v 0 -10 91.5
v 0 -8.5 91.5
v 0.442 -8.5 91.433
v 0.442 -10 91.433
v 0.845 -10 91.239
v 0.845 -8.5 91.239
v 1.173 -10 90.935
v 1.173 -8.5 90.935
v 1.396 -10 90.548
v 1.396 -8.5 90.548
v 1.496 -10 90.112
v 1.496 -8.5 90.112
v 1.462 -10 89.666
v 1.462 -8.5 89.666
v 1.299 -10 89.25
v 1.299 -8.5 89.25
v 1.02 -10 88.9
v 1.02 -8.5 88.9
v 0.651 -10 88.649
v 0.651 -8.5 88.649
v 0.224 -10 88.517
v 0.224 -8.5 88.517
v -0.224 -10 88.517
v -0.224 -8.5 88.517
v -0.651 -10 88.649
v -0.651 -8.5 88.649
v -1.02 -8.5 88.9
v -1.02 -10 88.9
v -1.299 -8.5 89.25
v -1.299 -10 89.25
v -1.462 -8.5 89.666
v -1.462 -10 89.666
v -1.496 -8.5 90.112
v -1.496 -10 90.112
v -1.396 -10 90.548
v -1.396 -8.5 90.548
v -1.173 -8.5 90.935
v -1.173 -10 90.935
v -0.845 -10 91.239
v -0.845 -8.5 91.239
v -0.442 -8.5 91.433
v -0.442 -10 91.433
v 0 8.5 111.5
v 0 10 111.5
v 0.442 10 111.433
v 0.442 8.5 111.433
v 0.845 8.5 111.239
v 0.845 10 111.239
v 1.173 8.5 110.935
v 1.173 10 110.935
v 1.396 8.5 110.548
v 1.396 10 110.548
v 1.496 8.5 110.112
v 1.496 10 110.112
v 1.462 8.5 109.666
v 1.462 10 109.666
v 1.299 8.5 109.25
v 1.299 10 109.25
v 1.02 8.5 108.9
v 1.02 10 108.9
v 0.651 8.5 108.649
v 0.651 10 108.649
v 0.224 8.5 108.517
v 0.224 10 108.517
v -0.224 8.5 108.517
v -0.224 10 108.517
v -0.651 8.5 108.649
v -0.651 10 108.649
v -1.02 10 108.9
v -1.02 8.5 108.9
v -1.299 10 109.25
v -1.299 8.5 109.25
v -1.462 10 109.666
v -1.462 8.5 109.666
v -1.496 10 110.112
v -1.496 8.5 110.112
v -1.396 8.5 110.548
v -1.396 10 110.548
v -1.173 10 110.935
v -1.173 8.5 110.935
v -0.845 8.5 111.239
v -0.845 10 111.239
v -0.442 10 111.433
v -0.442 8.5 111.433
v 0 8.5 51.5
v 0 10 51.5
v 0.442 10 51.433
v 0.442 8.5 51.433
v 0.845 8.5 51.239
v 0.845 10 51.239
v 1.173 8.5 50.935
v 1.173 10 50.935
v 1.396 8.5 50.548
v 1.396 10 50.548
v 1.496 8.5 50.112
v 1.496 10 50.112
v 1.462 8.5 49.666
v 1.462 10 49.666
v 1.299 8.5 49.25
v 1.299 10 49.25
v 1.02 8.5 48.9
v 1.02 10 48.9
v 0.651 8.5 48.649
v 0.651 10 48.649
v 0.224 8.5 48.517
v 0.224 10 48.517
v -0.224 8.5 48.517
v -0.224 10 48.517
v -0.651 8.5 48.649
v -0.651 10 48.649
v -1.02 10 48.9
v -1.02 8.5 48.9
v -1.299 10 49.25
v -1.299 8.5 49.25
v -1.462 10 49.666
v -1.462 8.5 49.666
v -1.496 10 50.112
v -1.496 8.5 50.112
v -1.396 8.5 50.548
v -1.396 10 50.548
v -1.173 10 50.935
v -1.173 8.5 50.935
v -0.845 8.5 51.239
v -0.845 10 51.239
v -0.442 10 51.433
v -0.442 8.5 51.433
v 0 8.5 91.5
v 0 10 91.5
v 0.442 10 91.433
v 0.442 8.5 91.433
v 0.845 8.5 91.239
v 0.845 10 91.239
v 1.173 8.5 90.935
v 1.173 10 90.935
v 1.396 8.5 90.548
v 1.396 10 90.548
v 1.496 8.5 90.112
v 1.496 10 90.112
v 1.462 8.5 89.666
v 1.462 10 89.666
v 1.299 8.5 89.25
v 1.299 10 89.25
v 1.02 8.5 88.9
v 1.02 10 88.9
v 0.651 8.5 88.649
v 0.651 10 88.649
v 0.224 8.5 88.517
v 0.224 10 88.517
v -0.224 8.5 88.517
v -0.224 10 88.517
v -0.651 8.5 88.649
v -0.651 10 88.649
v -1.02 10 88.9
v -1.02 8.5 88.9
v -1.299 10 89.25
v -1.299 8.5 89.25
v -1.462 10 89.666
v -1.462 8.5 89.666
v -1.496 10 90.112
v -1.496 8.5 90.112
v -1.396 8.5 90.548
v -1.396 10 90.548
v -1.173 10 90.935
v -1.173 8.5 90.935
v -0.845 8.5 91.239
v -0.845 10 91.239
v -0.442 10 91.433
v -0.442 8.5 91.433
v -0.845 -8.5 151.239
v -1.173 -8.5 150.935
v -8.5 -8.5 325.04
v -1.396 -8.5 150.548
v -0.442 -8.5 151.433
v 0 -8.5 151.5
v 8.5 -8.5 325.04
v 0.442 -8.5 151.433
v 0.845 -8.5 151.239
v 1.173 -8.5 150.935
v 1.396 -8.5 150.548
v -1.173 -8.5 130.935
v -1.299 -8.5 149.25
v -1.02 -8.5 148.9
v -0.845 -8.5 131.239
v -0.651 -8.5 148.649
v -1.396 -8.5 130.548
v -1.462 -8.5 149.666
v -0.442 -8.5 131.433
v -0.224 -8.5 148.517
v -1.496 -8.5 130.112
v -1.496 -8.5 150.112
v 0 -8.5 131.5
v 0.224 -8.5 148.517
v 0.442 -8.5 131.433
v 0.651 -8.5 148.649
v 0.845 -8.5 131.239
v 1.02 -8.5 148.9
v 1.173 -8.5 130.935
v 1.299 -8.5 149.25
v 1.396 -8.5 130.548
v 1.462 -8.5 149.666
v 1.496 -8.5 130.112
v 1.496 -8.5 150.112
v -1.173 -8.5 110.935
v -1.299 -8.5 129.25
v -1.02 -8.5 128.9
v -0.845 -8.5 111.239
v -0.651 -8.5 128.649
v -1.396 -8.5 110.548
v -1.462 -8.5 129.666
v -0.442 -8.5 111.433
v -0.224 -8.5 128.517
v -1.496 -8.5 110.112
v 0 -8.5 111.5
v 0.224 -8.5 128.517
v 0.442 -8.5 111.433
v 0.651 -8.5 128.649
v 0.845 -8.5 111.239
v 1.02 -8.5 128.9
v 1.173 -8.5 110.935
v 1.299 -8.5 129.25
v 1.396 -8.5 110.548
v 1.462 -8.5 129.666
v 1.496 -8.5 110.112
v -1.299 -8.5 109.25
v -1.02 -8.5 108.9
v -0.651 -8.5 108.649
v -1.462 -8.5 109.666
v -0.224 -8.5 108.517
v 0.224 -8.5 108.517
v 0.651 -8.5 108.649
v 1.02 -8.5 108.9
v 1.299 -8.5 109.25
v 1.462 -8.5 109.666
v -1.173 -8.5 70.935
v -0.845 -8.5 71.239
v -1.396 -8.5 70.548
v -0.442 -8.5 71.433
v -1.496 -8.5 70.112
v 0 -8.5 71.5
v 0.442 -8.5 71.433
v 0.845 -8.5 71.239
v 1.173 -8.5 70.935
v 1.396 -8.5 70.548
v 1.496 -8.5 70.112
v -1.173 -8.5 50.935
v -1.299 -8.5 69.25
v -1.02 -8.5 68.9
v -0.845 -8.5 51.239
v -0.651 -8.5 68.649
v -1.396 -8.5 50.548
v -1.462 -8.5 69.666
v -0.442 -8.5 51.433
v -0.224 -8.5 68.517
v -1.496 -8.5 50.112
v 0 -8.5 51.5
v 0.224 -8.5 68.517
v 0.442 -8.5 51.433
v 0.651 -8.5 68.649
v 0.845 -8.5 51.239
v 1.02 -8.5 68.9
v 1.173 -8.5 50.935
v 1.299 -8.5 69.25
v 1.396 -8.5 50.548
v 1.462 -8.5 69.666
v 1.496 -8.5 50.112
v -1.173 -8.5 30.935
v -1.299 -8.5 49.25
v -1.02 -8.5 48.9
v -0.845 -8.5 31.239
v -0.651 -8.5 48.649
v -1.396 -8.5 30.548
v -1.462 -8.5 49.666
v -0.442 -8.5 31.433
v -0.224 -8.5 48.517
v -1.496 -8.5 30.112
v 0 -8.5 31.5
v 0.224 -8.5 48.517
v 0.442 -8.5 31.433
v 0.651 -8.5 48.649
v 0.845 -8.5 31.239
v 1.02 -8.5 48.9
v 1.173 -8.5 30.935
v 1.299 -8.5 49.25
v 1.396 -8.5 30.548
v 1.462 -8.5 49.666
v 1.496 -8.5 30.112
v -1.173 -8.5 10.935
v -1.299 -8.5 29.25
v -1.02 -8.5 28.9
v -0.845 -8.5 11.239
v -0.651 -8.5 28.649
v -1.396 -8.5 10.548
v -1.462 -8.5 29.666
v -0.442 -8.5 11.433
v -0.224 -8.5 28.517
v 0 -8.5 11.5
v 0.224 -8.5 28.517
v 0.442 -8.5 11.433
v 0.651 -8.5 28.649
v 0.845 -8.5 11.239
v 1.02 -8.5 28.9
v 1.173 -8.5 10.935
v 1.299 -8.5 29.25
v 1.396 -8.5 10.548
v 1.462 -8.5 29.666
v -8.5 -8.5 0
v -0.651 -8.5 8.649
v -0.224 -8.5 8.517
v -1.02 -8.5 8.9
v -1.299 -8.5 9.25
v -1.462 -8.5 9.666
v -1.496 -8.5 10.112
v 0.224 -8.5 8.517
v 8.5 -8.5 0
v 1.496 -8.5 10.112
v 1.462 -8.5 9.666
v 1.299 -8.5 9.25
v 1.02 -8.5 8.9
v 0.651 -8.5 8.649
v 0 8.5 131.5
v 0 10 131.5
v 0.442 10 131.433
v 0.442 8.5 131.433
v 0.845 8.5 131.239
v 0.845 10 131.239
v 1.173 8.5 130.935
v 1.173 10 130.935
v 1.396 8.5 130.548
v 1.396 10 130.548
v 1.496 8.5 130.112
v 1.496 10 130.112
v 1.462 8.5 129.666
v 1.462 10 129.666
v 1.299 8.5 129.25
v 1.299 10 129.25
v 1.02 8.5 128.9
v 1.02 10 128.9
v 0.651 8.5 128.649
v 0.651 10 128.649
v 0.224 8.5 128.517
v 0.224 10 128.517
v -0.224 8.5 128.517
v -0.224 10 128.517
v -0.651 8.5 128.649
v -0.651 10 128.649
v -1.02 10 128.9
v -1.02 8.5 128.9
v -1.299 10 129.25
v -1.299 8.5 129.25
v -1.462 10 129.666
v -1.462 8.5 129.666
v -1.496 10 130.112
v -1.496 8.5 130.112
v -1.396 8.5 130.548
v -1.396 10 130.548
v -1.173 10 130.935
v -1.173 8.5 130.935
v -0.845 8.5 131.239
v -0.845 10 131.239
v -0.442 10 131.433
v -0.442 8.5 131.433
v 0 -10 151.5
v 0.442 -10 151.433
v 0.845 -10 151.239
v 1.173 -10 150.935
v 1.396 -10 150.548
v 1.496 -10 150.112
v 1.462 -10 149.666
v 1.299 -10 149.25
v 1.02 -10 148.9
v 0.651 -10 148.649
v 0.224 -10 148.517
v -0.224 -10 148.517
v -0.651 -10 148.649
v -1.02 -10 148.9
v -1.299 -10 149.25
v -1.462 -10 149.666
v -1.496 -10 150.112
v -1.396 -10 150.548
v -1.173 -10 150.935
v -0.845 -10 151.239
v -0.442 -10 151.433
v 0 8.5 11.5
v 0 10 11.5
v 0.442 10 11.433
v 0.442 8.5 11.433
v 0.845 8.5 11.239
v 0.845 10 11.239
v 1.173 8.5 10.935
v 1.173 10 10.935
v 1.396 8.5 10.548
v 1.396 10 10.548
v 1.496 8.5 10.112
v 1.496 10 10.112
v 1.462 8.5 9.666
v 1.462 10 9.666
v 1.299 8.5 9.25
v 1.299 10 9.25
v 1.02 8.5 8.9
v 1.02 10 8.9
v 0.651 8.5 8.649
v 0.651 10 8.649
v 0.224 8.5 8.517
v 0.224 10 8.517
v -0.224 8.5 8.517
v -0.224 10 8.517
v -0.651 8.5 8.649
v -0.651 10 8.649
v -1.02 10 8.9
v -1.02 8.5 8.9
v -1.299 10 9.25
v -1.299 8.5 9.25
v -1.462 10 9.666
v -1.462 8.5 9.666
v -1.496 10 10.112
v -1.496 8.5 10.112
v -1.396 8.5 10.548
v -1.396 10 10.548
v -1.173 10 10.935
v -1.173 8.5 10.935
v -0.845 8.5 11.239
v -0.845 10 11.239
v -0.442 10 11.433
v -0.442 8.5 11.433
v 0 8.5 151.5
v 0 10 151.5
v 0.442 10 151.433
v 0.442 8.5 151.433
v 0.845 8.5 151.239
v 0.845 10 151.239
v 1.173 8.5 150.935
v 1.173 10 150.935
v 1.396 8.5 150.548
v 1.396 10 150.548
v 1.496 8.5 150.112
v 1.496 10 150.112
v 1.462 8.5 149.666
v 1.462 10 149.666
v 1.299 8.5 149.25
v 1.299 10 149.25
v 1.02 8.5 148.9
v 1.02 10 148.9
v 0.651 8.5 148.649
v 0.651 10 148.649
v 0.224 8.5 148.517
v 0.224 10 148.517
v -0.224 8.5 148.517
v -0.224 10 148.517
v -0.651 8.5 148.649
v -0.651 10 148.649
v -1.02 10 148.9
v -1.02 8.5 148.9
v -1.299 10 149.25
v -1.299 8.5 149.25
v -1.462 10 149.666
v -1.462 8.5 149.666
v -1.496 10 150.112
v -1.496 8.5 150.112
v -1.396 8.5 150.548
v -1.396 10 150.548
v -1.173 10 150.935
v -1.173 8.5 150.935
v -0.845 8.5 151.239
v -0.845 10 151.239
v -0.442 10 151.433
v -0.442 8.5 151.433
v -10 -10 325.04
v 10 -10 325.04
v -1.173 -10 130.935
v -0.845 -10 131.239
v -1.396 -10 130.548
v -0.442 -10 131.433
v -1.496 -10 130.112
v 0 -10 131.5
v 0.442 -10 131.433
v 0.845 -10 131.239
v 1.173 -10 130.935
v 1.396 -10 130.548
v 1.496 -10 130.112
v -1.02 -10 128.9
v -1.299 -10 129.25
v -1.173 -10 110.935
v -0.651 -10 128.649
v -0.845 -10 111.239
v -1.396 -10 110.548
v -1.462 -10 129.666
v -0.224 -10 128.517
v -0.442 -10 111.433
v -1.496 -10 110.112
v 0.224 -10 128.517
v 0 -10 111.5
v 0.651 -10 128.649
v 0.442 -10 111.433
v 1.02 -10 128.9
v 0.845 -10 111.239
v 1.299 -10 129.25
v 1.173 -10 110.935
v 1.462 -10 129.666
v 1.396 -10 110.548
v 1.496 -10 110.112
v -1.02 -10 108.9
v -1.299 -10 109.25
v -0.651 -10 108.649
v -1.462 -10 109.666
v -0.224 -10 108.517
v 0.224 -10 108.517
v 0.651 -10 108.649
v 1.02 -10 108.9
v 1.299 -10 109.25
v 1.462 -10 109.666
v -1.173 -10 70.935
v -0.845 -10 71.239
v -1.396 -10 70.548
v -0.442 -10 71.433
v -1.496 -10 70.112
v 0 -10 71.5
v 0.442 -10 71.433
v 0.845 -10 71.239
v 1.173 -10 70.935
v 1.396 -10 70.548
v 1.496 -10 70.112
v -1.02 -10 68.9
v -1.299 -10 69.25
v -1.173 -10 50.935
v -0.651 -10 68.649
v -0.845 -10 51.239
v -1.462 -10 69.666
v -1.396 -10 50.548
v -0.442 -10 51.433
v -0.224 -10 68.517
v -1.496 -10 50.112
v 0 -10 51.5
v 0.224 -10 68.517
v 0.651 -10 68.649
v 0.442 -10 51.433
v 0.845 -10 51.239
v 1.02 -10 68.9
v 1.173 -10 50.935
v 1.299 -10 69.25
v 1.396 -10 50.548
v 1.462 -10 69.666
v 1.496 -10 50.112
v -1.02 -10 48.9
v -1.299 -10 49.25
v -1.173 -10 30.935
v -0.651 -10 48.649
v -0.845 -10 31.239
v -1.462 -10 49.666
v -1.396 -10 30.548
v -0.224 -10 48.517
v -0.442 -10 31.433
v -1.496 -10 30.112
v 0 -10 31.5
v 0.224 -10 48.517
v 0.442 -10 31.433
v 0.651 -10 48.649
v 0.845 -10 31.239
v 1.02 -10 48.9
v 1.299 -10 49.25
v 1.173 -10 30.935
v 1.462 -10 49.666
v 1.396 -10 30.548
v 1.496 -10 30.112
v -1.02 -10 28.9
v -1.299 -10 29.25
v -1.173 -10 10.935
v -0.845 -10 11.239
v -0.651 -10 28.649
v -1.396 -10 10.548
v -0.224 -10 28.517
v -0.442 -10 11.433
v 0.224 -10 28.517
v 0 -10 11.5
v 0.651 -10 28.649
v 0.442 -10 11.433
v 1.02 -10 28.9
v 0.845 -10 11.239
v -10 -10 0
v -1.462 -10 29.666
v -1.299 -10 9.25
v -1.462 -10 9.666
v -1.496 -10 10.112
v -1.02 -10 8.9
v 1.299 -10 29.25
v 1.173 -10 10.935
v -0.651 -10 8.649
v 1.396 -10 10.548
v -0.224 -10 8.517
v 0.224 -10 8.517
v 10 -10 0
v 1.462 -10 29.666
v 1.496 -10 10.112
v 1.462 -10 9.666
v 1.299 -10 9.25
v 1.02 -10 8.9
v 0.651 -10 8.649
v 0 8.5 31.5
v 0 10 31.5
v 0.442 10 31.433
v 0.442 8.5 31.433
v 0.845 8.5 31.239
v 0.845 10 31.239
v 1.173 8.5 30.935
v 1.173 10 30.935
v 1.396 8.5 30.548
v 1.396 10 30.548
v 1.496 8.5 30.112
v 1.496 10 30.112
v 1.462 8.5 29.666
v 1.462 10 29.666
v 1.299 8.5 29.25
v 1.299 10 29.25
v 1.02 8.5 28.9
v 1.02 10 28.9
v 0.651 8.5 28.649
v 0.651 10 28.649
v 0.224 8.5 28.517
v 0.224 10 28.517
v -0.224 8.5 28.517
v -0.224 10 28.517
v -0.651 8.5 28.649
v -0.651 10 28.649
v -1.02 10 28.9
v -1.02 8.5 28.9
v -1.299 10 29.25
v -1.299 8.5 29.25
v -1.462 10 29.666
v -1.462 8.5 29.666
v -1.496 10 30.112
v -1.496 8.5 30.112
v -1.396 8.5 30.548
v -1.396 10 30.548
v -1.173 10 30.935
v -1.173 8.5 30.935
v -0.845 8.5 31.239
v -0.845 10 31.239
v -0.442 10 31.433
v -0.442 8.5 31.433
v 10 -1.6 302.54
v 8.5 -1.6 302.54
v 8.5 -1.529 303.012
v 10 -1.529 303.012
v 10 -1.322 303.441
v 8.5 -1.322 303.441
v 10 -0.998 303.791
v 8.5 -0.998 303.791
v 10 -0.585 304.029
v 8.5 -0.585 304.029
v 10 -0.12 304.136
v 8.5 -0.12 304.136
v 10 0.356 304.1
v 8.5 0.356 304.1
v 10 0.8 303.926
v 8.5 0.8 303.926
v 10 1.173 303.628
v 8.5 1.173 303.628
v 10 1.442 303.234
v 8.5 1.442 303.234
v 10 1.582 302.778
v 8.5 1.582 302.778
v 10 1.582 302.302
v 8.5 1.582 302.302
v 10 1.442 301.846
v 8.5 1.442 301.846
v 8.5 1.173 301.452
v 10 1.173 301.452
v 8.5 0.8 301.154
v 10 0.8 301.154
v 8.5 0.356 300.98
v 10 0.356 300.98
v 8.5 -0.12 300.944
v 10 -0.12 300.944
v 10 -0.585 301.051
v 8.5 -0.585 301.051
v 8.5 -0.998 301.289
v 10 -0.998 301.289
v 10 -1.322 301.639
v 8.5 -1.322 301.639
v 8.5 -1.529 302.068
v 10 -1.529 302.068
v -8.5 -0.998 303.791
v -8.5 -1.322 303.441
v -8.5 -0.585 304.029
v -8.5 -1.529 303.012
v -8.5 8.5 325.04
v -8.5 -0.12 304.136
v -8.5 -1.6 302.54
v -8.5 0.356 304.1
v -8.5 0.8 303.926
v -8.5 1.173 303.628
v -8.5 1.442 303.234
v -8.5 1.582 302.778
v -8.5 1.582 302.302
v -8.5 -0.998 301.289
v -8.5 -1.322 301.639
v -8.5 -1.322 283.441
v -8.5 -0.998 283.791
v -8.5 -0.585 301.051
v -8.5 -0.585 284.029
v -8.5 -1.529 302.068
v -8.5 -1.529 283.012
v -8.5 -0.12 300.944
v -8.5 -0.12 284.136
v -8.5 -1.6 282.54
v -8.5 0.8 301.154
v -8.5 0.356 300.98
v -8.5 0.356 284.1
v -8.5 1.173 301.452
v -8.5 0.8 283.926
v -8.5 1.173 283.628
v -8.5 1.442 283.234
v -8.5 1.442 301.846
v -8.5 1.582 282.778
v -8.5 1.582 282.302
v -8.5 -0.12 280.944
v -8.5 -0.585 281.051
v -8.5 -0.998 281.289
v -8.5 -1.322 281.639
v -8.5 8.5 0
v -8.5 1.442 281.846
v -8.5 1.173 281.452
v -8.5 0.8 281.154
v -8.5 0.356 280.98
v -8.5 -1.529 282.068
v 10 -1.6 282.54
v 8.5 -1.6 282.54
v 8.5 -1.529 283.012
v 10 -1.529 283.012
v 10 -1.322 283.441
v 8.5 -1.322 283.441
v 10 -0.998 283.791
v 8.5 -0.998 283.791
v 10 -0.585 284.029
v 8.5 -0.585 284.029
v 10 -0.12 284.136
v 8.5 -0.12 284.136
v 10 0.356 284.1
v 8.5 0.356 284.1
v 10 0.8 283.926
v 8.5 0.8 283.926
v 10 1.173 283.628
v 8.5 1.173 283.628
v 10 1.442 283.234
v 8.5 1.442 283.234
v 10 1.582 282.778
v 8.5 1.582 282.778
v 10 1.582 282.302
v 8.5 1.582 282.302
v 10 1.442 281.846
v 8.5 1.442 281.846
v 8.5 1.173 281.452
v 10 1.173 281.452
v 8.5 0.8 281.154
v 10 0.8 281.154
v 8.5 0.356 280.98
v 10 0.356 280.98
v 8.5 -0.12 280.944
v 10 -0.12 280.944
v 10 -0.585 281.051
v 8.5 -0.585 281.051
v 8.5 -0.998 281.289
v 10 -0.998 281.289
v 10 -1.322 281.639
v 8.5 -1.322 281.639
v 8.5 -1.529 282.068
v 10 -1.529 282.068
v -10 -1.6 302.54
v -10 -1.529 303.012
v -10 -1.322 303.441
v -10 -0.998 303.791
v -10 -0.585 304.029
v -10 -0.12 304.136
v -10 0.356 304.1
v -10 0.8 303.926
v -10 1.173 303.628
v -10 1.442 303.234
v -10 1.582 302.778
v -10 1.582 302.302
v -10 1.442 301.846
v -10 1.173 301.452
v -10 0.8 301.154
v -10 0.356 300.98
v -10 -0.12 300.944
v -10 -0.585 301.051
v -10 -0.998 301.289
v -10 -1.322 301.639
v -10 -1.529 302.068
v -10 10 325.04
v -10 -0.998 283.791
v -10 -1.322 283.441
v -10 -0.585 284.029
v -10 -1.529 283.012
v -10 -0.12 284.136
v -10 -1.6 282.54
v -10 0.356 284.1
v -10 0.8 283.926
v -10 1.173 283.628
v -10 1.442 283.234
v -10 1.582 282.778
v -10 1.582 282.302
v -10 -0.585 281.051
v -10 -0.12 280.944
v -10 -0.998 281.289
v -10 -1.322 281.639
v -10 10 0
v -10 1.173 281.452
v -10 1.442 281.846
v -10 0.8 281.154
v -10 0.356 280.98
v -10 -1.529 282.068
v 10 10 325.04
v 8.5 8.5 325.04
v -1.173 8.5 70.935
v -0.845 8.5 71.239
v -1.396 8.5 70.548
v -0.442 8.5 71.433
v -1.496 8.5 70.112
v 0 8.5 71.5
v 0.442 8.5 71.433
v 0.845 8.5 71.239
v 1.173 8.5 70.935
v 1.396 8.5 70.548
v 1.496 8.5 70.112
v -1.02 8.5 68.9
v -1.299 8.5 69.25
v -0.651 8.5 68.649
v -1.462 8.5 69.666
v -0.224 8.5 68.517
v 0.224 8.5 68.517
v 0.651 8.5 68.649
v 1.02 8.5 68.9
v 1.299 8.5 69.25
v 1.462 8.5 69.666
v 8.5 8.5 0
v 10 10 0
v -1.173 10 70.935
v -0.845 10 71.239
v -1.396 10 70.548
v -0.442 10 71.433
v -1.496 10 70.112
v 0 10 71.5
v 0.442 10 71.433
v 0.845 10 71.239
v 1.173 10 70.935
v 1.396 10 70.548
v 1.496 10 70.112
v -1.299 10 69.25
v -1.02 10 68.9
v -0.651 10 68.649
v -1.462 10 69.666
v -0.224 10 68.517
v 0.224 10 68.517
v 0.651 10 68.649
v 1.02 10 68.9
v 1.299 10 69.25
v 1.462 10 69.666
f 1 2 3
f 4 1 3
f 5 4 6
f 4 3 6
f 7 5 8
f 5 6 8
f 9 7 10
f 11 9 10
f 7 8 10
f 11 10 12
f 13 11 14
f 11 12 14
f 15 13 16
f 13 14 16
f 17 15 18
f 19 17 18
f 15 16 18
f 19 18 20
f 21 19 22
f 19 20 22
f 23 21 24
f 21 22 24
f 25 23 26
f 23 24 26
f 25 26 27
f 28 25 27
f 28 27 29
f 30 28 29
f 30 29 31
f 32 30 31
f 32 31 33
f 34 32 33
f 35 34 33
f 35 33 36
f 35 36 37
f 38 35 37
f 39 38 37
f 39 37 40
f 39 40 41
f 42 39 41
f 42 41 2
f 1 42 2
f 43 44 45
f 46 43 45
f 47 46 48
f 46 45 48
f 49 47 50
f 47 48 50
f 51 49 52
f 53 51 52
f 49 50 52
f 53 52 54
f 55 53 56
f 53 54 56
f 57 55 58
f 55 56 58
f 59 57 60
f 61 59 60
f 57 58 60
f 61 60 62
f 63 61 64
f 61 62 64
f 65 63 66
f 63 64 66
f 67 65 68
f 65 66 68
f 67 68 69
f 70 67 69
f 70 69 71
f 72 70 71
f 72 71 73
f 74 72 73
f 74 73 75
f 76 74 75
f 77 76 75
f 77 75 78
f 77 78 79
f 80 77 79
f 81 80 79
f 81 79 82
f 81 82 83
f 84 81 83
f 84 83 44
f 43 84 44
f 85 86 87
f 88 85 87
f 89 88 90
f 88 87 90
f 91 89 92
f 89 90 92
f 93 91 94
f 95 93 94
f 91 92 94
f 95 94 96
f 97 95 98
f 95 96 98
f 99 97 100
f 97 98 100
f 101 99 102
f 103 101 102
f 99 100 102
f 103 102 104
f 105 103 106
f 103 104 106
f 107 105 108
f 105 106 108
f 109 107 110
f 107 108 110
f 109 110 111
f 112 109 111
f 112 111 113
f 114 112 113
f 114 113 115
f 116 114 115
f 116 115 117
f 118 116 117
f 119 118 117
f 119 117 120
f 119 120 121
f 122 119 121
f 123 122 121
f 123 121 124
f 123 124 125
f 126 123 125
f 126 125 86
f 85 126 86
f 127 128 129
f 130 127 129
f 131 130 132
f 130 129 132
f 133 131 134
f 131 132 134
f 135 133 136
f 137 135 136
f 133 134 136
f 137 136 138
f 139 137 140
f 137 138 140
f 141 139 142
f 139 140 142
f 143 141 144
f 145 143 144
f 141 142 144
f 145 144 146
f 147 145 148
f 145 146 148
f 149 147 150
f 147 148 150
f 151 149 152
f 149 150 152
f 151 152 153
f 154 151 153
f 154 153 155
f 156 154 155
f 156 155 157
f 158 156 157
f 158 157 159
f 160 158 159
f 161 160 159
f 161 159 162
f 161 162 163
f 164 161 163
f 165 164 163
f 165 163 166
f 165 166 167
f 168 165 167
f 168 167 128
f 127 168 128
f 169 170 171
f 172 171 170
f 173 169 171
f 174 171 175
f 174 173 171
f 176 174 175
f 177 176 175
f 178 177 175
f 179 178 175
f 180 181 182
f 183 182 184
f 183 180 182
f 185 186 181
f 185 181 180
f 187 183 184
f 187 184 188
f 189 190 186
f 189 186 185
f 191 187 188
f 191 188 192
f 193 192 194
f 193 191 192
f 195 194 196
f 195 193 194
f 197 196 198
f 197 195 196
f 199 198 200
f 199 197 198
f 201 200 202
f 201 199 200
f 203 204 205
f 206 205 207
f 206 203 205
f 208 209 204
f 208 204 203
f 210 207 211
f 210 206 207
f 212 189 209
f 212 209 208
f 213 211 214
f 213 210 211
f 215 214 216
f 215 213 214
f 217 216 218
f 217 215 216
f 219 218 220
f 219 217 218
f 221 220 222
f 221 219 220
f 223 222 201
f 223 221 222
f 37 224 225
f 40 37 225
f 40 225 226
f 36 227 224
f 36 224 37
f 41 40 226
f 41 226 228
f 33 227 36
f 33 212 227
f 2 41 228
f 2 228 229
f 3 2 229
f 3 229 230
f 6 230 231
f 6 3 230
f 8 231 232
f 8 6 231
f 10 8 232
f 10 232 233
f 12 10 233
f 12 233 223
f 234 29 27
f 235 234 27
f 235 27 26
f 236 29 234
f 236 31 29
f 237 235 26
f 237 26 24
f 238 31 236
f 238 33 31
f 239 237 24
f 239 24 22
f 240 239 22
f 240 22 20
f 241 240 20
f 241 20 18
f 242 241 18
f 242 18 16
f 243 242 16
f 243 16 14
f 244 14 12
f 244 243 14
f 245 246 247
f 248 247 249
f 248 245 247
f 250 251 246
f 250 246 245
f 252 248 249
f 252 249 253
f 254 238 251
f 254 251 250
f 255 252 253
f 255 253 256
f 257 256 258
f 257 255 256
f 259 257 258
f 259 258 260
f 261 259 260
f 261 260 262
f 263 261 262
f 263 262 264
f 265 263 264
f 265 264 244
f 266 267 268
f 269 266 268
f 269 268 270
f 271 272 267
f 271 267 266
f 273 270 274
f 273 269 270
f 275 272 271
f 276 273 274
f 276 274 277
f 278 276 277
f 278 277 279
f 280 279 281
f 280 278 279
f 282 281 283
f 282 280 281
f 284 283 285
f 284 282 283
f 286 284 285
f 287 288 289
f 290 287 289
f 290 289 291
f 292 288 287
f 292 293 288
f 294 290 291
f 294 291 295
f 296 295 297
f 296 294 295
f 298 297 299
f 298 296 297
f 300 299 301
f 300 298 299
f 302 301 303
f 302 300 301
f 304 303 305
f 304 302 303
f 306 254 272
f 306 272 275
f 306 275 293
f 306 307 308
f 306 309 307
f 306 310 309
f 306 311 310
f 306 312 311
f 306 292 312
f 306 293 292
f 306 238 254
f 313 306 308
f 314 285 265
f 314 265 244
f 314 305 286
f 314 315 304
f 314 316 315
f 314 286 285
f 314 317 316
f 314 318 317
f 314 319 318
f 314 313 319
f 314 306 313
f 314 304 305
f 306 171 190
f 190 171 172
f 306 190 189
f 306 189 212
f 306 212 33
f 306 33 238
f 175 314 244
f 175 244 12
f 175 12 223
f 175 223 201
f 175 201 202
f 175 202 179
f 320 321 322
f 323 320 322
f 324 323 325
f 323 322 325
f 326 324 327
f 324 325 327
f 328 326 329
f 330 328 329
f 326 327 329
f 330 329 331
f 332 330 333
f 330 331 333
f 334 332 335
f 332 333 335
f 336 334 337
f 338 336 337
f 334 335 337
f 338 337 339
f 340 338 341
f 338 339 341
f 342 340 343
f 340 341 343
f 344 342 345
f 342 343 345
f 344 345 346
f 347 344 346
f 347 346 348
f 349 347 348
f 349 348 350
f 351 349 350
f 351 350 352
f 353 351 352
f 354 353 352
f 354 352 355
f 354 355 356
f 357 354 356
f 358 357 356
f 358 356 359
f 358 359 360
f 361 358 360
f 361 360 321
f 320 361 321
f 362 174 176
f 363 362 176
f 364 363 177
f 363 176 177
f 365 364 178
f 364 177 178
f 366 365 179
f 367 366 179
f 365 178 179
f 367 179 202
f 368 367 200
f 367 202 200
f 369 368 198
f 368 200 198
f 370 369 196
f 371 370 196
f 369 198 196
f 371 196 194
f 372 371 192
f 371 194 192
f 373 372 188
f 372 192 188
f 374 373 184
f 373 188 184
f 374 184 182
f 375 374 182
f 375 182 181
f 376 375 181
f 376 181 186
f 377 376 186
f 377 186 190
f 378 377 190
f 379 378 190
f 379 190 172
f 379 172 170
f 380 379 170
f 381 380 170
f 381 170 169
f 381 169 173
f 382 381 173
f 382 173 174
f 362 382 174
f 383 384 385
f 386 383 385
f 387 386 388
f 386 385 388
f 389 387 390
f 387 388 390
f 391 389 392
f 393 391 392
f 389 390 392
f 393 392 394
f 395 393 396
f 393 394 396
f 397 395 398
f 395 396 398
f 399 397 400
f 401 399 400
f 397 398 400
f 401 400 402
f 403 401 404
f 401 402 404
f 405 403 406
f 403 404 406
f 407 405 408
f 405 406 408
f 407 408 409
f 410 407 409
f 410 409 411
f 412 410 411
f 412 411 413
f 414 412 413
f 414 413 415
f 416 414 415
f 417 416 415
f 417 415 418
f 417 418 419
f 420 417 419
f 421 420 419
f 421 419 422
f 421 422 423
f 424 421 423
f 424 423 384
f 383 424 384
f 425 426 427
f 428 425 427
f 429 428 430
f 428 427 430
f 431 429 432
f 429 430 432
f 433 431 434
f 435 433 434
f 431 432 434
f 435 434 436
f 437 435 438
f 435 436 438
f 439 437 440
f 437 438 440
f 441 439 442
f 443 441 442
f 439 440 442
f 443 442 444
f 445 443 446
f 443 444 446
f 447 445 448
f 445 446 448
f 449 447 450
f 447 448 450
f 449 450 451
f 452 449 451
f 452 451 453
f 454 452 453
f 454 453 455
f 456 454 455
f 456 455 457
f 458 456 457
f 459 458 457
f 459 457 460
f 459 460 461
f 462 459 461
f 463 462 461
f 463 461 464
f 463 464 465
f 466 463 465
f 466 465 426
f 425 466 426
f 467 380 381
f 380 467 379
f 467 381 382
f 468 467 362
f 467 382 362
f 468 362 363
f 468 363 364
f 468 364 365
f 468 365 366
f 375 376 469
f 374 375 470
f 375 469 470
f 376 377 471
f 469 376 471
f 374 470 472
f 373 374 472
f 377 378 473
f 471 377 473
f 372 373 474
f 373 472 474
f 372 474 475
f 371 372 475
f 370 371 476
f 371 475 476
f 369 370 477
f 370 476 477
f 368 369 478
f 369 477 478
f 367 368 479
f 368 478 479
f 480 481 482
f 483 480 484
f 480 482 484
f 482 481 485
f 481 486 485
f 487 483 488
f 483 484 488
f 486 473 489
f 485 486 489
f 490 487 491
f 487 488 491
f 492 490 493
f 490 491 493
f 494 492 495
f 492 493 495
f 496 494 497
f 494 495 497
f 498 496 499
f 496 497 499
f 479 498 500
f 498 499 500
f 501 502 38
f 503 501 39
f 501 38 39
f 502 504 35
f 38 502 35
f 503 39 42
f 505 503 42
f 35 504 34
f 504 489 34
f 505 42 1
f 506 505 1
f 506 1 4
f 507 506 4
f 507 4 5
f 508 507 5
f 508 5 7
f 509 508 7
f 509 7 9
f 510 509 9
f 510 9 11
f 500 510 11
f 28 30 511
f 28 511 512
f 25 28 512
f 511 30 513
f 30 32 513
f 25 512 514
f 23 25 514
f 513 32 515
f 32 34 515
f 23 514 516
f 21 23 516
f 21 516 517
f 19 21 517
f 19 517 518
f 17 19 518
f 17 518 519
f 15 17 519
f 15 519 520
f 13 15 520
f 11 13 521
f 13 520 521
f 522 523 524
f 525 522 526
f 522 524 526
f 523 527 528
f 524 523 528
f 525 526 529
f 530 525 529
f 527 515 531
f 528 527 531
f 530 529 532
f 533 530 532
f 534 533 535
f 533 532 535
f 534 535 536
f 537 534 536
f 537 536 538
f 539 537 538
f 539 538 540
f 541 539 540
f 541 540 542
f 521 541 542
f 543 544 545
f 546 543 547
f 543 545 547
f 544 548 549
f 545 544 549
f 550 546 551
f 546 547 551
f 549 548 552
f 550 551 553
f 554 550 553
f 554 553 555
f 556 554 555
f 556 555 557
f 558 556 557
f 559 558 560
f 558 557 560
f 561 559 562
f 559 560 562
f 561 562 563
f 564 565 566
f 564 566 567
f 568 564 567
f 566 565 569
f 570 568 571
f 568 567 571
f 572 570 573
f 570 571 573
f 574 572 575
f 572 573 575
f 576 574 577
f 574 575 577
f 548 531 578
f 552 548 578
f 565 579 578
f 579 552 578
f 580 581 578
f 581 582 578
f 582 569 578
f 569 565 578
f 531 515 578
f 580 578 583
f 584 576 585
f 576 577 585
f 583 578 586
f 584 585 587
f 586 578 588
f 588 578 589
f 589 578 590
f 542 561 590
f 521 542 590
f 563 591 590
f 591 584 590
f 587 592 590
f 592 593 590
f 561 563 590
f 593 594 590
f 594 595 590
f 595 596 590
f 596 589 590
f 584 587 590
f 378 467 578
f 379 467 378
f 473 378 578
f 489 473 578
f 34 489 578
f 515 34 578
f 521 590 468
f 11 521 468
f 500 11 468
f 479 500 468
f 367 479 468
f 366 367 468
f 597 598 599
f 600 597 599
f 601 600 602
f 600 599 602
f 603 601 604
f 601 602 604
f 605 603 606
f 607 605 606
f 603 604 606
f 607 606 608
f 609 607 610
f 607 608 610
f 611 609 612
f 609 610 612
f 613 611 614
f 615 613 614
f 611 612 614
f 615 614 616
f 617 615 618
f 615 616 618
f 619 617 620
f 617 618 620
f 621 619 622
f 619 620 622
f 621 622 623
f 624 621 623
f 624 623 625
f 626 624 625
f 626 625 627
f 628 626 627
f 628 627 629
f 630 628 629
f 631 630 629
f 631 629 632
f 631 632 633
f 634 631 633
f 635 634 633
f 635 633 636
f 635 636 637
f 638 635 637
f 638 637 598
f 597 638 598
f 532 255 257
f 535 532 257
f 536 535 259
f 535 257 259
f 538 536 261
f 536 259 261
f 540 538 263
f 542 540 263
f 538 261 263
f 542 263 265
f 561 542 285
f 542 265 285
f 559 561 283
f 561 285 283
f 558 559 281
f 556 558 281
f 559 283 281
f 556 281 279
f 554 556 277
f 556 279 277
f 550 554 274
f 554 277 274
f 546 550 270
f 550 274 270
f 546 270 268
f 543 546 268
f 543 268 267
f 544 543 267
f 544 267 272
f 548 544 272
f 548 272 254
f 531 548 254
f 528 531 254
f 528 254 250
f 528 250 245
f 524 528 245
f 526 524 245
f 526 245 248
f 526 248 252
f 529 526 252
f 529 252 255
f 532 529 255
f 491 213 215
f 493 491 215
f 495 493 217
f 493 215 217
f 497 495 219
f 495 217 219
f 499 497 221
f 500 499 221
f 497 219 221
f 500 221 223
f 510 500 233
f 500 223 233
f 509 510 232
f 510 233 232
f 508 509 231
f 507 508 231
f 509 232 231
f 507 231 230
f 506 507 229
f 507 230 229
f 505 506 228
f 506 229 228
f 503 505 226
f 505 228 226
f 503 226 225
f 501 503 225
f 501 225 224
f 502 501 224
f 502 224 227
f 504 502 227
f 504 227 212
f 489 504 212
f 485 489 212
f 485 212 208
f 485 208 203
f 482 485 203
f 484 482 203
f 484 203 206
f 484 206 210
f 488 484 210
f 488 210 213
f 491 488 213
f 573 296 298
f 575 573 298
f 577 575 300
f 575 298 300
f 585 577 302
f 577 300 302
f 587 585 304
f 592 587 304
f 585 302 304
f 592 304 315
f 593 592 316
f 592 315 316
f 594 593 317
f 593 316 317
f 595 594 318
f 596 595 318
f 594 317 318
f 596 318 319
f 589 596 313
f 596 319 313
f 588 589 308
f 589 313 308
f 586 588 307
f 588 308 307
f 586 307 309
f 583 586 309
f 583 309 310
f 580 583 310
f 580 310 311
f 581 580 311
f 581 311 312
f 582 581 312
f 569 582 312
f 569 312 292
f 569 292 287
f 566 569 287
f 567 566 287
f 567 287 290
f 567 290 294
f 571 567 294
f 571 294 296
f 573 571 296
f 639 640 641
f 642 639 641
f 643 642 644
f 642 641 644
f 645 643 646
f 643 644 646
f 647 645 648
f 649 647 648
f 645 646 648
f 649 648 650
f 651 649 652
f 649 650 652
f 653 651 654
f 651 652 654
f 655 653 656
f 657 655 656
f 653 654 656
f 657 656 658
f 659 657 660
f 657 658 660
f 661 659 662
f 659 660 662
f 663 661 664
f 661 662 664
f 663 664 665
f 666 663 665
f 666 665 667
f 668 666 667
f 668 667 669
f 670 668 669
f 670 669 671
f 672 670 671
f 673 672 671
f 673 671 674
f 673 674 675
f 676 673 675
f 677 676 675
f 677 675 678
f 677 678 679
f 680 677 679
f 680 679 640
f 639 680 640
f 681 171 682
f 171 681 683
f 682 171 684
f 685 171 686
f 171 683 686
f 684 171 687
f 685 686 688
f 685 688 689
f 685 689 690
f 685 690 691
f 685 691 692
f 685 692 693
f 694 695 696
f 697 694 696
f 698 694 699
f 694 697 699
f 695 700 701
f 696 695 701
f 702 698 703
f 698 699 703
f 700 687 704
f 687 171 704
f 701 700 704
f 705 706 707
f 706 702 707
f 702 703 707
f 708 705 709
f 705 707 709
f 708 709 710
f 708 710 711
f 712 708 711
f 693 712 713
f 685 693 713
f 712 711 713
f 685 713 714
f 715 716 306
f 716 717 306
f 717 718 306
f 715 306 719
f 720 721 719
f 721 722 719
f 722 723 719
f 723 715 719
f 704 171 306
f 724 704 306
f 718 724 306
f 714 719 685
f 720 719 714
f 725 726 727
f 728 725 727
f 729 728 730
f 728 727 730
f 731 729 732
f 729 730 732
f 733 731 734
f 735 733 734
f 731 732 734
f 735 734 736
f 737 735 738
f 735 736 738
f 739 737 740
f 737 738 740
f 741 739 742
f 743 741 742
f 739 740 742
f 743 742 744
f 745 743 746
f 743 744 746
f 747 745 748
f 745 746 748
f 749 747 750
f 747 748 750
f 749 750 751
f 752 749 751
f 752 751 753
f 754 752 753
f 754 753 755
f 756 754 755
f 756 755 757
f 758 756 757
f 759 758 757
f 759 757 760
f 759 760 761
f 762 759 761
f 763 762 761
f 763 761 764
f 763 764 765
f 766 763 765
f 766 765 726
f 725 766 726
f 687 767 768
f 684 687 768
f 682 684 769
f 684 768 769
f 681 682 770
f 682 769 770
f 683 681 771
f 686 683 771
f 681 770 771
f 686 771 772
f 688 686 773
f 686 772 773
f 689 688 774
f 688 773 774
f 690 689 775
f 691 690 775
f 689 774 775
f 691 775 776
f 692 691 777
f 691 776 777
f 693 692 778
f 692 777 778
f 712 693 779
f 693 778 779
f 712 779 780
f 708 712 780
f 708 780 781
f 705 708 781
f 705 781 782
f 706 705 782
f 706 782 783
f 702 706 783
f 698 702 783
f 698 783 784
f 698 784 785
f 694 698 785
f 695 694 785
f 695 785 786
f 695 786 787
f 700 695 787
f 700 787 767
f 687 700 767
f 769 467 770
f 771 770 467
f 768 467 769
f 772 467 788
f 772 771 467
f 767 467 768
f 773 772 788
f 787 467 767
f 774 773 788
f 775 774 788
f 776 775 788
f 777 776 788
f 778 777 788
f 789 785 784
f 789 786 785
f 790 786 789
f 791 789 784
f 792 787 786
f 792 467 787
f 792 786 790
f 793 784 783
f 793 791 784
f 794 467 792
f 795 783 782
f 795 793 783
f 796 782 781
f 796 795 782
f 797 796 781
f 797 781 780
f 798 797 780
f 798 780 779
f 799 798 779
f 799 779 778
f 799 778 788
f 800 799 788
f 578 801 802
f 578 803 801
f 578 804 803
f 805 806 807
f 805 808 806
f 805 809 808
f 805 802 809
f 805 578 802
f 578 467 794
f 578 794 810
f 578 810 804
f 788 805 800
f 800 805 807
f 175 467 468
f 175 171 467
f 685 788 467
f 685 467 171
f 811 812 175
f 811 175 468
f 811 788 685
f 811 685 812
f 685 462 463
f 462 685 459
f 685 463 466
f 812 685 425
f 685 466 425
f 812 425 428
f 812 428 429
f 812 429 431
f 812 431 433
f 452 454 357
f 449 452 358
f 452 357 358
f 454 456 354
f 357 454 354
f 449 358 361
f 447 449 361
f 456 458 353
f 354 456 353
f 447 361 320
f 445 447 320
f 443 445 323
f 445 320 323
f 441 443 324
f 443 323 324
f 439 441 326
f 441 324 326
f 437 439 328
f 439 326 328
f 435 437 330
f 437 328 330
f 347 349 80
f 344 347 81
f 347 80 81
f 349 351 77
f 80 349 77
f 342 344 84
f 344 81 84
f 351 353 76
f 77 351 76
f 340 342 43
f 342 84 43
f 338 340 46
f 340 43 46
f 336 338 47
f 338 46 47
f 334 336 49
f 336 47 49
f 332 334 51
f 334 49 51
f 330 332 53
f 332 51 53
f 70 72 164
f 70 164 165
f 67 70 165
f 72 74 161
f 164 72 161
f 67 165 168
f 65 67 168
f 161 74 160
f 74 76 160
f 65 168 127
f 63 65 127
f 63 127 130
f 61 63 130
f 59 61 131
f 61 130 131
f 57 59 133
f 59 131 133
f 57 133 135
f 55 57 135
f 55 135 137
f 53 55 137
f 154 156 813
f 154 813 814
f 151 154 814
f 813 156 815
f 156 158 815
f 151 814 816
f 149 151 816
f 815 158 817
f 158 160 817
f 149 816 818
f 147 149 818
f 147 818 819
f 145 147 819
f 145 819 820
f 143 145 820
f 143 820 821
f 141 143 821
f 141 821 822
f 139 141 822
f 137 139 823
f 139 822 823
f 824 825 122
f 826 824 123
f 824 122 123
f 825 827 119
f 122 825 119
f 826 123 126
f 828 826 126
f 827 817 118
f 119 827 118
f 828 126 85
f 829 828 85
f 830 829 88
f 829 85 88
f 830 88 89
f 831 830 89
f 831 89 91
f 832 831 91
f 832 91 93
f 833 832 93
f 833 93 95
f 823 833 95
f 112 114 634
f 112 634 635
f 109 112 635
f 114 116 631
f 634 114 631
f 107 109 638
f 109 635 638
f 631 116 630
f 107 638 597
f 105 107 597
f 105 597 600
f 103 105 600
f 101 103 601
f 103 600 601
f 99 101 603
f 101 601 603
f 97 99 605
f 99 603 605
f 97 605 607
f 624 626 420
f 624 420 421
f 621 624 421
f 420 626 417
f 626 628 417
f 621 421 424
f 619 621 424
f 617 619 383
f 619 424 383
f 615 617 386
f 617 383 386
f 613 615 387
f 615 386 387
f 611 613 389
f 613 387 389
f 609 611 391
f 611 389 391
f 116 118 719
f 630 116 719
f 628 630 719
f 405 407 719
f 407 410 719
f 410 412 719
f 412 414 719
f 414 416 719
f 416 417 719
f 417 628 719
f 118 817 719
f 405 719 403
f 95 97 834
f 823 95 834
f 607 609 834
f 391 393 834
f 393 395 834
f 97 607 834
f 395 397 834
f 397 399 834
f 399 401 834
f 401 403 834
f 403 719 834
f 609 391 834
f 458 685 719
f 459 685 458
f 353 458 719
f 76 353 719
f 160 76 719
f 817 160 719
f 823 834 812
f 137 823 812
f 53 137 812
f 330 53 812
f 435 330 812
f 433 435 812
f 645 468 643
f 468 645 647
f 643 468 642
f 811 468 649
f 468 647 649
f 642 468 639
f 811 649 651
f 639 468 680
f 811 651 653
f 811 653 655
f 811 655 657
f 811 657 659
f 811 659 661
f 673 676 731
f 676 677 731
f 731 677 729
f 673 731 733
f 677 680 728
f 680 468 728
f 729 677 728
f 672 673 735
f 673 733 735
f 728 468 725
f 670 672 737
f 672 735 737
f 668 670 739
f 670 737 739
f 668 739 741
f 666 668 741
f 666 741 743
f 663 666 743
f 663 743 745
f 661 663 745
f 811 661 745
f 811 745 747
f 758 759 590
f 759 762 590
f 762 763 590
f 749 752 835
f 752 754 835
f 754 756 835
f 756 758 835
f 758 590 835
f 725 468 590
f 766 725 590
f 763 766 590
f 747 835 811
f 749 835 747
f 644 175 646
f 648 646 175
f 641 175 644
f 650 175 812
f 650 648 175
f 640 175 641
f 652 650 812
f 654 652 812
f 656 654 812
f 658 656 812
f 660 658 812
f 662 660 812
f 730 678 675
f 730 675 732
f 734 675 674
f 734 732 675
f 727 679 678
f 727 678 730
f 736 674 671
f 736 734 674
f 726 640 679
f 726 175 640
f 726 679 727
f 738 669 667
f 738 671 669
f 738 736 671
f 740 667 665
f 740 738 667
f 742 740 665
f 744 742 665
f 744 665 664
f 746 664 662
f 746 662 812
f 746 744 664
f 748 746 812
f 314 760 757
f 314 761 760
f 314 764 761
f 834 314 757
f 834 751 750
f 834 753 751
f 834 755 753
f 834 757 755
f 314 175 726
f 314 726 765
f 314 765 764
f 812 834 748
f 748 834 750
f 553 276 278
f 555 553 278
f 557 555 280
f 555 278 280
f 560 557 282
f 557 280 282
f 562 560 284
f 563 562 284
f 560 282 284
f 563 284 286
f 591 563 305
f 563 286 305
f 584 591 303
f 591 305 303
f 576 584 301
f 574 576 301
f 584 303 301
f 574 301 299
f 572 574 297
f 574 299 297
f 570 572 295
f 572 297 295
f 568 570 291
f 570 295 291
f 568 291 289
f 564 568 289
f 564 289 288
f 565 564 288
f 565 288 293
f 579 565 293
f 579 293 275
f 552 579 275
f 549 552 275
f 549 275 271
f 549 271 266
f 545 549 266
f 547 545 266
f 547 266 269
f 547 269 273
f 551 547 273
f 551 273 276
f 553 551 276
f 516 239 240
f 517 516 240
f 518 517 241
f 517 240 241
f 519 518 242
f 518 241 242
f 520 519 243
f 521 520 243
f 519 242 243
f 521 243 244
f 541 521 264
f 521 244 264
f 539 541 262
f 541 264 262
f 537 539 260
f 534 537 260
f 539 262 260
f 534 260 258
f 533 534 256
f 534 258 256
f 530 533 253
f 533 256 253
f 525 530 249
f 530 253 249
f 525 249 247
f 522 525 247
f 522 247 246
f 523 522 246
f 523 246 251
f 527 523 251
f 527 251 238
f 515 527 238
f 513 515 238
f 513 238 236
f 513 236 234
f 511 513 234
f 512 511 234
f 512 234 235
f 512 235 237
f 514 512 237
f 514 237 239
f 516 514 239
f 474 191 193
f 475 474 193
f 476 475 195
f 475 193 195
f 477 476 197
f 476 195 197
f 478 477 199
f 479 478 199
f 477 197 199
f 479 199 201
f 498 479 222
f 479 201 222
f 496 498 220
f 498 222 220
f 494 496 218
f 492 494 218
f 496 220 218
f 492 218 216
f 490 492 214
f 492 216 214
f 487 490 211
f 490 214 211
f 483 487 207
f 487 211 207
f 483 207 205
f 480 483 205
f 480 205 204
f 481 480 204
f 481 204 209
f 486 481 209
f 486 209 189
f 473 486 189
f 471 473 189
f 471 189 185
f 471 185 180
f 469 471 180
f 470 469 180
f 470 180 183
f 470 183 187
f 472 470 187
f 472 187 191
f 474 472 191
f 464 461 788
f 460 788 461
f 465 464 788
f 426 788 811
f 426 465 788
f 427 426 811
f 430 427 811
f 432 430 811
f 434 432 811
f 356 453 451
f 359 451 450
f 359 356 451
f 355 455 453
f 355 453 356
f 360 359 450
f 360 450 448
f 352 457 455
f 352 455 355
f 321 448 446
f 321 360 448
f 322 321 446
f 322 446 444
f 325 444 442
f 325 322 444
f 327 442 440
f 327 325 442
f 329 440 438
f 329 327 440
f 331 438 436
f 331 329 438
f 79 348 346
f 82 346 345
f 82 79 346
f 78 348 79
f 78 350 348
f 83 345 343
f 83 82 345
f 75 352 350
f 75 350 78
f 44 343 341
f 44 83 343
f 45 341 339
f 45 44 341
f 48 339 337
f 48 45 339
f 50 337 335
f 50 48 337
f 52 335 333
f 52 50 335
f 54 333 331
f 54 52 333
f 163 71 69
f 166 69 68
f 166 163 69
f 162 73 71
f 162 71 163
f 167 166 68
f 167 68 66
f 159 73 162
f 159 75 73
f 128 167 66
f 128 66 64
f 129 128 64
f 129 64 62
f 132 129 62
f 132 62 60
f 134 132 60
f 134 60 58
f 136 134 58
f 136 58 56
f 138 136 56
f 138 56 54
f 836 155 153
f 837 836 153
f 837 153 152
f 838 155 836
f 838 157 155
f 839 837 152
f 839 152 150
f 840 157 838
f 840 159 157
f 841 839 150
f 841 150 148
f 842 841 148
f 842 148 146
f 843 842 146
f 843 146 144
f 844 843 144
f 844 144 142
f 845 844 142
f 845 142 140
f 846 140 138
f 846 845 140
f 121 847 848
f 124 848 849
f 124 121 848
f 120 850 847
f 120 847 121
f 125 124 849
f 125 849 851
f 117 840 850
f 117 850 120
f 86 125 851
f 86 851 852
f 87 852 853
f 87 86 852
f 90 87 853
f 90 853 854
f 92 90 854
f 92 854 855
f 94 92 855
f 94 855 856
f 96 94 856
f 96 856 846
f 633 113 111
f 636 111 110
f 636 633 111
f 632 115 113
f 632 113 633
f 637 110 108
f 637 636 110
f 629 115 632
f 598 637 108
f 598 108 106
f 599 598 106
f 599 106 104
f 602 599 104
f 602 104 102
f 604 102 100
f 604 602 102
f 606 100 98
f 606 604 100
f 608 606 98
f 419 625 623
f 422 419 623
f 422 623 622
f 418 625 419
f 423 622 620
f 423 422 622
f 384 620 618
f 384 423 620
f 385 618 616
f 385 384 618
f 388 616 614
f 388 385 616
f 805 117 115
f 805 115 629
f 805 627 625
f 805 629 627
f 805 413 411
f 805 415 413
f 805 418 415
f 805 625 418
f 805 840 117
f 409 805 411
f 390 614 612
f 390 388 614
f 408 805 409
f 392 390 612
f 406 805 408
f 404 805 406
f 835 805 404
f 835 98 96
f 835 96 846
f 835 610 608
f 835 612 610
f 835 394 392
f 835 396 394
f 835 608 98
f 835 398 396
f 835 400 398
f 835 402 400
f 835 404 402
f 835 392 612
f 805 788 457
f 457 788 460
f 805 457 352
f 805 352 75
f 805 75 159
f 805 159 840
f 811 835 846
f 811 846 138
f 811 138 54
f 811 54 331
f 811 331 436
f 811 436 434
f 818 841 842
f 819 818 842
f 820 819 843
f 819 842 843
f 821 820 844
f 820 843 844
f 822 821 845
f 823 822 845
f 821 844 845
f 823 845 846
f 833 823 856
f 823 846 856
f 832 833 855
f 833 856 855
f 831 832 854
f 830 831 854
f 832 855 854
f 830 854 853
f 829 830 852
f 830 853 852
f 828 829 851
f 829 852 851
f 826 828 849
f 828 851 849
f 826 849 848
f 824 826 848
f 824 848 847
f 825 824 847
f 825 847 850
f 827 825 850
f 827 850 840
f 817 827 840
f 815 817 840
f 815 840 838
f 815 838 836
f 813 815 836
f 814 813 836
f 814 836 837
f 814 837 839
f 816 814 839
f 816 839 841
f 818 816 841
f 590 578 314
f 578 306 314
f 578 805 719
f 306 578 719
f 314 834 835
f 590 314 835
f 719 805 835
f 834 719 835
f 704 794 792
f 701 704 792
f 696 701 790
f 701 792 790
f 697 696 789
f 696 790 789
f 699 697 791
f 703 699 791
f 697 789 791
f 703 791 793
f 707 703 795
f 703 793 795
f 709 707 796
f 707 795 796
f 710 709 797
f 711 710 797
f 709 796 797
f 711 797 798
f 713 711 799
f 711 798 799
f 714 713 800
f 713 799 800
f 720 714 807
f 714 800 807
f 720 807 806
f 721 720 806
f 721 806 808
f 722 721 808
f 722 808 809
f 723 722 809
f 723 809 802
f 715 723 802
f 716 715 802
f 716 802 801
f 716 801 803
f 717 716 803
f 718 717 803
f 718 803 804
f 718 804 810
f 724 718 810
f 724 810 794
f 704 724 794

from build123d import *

# Parameters (mm, degrees)
SKETCH_1_W          = 20
SKETCH_1_H          = 20
SKETCH_1_W_2        = 17
SKETCH_1_H_2        = 17
EXTRUDE_1_DEPTH     = 325.04
SKETCH_4_R          = 1.6
CUT_EXTRUDE_3_DEPTH = 326.808228257
SKETCH_6_R          = 1.5
CUT_EXTRUDE_5_DEPTH = 326.808228257


with BuildPart() as part:
    # 草图1 → 凸台-拉伸1 (new body)
    with BuildSketch(Plane.XY):
        Rectangle(SKETCH_1_W, SKETCH_1_H)
        Rectangle(SKETCH_1_W_2, SKETCH_1_H_2, mode=Mode.SUBTRACT)
    extrude(amount=EXTRUDE_1_DEPTH)

    # 草图4 → 切除-拉伸3 (cut, through all)
    with BuildSketch(Plane.ZY.offset(10)):
        with Locations(Location((282.54, 0, 0), (0, 0, 270))):
            Circle(SKETCH_4_R)
        with Locations(Location((302.54, 0, 0), (0, 0, 270))):
            Circle(SKETCH_4_R)
    extrude(amount=-CUT_EXTRUDE_3_DEPTH, mode=Mode.SUBTRACT)

    # 草图6 → 切除-拉伸5 (cut, through all)
    with BuildSketch(Plane(origin=(0, 10, 0), x_dir=(1, 0, 0), z_dir=(0, 1, 0))):
        with Locations(Location((0, -10, 0), (0, 0, 270))):
            Circle(SKETCH_6_R)
        with Locations(Location((0, -30, 0), (0, 0, 270))):
            Circle(SKETCH_6_R)
        with Locations(Location((0, -50, 0), (0, 0, 270))):
            Circle(SKETCH_6_R)
        with Locations(Location((0, -70, 0), (0, 0, 270))):
            Circle(SKETCH_6_R)
        with Locations(Location((0, -90, 0), (0, 0, 270))):
            Circle(SKETCH_6_R)
        with Locations(Location((0, -110, 0), (0, 0, 270))):
            Circle(SKETCH_6_R)
        with Locations(Location((0, -130, 0), (0, 0, 270))):
            Circle(SKETCH_6_R)
        with Locations(Location((0, -150, 0), (0, 0, 270))):
            Circle(SKETCH_6_R)
    extrude(amount=-CUT_EXTRUDE_5_DEPTH, mode=Mode.SUBTRACT)


solid = part.part
